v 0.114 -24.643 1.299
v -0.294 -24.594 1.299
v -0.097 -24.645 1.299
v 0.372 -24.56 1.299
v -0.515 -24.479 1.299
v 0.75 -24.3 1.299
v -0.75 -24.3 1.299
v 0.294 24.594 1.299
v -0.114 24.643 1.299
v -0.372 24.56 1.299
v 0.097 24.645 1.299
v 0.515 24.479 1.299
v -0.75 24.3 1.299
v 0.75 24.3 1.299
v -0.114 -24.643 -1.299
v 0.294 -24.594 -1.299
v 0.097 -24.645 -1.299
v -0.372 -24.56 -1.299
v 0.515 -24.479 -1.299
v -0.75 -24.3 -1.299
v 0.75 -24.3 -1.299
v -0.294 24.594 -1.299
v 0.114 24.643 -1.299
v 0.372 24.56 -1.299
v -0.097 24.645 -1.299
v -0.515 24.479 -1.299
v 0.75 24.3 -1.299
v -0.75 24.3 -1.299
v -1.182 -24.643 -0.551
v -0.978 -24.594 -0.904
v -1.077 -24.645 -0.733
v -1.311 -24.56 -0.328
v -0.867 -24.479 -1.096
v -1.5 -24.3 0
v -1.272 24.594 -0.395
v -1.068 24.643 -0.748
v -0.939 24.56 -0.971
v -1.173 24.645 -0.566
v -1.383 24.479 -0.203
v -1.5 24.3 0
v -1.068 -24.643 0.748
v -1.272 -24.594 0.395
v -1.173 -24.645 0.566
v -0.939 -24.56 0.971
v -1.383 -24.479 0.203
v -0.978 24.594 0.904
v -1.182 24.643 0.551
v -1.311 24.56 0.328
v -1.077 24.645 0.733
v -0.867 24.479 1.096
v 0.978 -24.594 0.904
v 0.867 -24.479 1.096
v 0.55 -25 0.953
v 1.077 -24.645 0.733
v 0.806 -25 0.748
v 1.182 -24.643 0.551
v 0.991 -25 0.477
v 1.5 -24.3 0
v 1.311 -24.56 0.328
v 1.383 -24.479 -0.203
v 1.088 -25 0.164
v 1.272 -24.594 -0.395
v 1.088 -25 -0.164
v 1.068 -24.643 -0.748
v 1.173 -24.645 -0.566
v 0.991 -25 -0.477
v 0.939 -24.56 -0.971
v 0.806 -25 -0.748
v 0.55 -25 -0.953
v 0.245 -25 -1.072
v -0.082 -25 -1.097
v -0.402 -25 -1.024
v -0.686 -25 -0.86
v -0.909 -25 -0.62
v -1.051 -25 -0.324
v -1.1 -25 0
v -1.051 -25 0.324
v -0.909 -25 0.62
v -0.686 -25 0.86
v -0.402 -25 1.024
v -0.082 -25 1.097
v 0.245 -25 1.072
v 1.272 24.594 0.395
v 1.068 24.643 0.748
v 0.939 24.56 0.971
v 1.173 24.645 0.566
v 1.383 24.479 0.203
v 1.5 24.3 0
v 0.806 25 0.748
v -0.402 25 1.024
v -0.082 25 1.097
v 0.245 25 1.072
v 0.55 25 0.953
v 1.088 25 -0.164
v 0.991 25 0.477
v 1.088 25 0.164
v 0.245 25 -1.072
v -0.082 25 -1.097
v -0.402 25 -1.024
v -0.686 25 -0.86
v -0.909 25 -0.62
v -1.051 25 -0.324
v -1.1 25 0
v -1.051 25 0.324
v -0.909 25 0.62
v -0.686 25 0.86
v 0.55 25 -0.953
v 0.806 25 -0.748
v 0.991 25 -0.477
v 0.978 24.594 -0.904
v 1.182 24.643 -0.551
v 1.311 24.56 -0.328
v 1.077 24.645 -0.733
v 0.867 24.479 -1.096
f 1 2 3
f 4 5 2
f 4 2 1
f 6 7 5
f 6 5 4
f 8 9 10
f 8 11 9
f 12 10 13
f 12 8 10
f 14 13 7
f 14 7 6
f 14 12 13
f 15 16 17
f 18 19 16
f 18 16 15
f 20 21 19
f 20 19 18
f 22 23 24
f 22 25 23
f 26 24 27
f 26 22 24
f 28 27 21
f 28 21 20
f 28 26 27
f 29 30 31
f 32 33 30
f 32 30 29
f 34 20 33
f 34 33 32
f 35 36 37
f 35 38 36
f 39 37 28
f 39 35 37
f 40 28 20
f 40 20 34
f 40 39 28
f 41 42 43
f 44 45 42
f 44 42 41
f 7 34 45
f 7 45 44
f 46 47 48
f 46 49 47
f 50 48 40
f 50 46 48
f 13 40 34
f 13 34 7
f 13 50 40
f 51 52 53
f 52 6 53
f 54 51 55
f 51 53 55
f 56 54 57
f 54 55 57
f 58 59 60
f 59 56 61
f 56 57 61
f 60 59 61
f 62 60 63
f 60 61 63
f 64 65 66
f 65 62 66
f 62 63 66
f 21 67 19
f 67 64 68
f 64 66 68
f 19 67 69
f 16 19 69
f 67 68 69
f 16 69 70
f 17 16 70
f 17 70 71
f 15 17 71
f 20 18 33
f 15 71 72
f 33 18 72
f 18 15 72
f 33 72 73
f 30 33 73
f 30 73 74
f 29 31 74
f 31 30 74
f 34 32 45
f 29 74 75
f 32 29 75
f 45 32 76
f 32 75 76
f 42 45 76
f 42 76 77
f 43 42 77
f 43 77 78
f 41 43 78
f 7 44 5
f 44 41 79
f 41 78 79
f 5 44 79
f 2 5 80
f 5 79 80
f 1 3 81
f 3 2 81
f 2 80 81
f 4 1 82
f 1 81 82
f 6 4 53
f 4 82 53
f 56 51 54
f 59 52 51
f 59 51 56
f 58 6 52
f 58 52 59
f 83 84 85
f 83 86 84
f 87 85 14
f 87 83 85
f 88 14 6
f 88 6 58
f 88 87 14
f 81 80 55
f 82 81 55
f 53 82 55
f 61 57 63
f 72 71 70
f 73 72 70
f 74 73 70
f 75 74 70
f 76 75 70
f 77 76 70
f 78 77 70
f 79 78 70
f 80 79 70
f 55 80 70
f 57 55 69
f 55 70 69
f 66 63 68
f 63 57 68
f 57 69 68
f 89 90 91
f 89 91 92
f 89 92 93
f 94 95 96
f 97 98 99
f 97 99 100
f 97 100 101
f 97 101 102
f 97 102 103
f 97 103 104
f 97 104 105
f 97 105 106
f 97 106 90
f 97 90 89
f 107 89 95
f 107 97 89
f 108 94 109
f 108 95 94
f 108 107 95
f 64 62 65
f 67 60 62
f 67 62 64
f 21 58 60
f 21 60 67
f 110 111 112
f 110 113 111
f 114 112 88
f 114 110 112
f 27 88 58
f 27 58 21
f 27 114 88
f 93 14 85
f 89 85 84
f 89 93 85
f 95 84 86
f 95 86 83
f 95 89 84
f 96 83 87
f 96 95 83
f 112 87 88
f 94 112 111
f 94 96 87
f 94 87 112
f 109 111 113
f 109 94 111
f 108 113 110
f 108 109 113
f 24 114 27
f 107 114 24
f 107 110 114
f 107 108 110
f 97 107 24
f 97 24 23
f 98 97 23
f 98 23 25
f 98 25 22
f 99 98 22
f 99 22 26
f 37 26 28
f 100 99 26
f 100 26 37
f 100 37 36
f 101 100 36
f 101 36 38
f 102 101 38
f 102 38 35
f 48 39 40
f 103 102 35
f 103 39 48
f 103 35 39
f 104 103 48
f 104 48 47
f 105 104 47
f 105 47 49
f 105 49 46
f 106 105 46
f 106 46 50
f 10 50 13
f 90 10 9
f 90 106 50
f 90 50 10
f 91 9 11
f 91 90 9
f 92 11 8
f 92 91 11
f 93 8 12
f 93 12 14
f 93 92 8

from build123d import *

# Parameters (mm, degrees)
BOSS_EXTRUDE1_DEPTH = 25


with BuildPart() as part:
    # Sketch1 → Boss-Extrude1 (new, symmetric)
    with BuildSketch(Plane(origin=(0, 0, 0), x_dir=(1, 0, 0), z_dir=(0, 1, 0))):
        Polygon((1.5, 0), (0.75, 1.299038106), (-0.75, 1.299038106), (-1.5, 0), (-0.75, -1.299038106), (0.75, -1.299038106), align=None)
    extrude(amount=BOSS_EXTRUDE1_DEPTH, both=True)

    # Sketch2 → Cut-Revolve1 (revolve, cut)
    with BuildSketch(Plane.XY, mode=Mode.PRIVATE) as cut_revolve1_sk:
        Polygon((1.5, 25), (1.5, 24.3), (1.1, 25), align=None)
        Polygon((1.5, -25), (1.5, -24.3), (1.1, -25), align=None)
    revolve(cut_revolve1_sk.sketch.rotate(Axis((0, -25, 0), (0, 1, 0)), 300.000003979), axis=Axis((0, -25, 0), (0, 1, 0)), mode=Mode.SUBTRACT)


solid = part.part
